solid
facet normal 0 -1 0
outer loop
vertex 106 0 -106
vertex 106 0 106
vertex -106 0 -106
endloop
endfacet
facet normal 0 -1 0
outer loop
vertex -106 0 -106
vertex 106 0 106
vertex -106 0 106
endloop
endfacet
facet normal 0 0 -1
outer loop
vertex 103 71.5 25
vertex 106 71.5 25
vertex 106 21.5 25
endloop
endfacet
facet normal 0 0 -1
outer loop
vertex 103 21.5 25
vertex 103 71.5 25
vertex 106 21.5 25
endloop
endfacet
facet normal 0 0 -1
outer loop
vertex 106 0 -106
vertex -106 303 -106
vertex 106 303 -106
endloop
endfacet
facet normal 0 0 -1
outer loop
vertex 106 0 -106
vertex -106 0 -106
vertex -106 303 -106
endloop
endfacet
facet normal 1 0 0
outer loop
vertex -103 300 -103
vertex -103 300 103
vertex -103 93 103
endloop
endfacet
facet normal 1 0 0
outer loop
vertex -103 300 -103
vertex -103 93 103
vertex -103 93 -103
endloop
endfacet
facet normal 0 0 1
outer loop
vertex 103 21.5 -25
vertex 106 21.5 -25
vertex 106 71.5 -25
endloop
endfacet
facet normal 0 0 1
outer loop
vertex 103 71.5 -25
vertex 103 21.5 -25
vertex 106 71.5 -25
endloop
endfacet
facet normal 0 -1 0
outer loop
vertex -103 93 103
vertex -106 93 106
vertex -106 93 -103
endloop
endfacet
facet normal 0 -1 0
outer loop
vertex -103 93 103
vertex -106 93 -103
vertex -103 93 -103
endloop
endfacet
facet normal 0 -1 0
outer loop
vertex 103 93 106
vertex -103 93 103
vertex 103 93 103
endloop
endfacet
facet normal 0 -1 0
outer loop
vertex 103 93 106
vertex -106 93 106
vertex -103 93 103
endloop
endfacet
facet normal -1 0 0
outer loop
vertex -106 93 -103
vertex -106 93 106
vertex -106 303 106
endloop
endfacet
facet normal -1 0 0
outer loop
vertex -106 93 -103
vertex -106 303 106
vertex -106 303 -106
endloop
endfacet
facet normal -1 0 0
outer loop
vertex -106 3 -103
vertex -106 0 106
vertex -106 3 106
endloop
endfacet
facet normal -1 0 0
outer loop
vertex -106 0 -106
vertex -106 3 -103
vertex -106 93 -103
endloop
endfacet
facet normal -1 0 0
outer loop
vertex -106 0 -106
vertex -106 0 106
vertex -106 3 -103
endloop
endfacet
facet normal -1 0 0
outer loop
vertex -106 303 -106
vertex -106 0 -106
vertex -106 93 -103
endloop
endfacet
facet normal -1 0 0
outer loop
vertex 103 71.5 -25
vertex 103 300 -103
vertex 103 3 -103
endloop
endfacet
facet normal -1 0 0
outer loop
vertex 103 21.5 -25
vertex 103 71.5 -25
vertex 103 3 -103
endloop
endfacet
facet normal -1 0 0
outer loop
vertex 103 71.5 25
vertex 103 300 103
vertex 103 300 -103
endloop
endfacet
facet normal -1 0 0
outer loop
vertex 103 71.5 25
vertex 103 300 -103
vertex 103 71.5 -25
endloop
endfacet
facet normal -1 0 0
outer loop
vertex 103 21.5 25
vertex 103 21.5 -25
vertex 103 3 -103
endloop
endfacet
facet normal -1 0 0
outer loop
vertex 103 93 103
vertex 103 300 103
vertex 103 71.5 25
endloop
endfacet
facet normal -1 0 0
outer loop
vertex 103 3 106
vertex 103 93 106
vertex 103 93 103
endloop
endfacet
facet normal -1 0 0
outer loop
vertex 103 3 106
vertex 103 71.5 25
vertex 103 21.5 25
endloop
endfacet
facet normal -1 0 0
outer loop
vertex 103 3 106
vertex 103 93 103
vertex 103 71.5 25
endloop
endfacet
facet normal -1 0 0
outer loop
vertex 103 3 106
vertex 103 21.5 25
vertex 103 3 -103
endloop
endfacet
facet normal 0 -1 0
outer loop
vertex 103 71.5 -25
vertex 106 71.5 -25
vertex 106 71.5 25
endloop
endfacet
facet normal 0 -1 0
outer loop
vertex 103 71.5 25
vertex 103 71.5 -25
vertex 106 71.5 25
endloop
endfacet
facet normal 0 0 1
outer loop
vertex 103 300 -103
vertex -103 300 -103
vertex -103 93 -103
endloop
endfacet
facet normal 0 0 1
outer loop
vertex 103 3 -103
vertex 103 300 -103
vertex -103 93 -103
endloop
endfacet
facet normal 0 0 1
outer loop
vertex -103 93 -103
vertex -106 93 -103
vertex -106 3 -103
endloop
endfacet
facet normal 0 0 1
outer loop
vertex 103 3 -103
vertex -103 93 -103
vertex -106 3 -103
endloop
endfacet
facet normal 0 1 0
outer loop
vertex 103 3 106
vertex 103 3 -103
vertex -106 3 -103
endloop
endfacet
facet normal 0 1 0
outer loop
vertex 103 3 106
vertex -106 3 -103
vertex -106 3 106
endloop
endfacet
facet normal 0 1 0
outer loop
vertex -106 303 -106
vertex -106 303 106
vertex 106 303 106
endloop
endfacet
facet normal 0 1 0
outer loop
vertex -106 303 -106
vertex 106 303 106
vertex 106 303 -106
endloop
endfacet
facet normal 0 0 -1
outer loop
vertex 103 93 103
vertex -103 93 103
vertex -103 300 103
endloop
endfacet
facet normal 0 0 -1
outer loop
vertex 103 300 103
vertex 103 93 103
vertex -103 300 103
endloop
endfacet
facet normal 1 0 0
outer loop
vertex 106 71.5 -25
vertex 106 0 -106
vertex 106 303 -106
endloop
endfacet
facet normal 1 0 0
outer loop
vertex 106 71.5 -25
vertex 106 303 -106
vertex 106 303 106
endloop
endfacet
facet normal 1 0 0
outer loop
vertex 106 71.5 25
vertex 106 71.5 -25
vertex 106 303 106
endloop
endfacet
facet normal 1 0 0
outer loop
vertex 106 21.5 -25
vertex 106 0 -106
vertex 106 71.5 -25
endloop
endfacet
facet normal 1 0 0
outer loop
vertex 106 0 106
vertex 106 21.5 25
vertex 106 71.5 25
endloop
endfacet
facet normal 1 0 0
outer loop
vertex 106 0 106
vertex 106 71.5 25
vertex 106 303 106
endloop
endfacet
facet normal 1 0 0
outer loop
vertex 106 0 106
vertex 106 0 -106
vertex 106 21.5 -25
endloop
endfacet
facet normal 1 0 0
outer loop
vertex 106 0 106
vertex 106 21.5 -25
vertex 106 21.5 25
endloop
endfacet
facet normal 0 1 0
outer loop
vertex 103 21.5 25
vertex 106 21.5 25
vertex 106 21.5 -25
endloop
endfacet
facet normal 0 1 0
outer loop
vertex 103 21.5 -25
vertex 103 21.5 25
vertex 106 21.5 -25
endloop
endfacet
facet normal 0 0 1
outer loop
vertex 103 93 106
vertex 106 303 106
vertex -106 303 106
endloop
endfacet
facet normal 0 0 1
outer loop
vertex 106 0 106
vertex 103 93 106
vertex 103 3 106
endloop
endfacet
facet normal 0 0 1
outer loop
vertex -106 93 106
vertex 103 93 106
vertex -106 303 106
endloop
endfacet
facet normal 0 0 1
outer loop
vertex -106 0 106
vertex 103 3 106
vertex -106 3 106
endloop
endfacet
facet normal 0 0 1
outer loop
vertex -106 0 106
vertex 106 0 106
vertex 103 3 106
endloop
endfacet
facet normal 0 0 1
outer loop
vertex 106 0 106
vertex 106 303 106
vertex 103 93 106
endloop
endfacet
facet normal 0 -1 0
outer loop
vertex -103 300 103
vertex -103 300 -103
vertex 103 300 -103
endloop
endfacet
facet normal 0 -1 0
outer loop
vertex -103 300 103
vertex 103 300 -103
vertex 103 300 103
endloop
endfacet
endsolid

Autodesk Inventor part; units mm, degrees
ref_plane "YZ Plane" through (0, 0, 0) normal (1, 0, 0) x (0, 1, 0)
ref_plane "XZ Plane" through (0, 0, 0) normal (0, 1, 0) x (-1, 0, 0)
ref_plane "XY Plane" through (0, 0, 0) normal (0, 0, 1) x (1, 0, 0)
sketch "Sketch1" plane through (0, 0, 0) normal (0, 1, 0) x (-1, 0, 0)
  line L0 (-106, 106) -> (106, 106)
  line L1 (106, 106) -> (106, -106)
  line L2 (106, -106) -> (-106, -106)
  line L3 (-106, -106) -> (-106, 106)
  line L4 (-106, 106) -> (106, -106) construction
  line L5 (106, 106) -> (-106, -106) construction
  point P0 (0, 0)
  dimension "d0" = 212
  dimension "d1" = 212
extrude "Extrusion1" add sketch "Sketch1" along normal blind 3
sketch "Sketch2" plane through (0, 3, 0) normal (0, 1, 0) x (1, 0, 0)
  line L0 (-106, 106) -> (-106, -106) projected
  line L1 (106, 106) -> (-106, 106) projected
  line L2 (-106, -106) -> (-103, -106)
  line L3 (-103, -106) -> (-103, 106)
  line L4 (-103, 106) -> (-106, 106)
  line L5 (-106, 106) -> (-106, -106)
  line L6 (106, -106) -> (106, 106) projected
  line L7 (-106, -106) -> (106, -106) projected
  line L8 (106, 106) -> (103, 106)
  line L9 (103, 106) -> (103, -106)
  line L10 (103, -106) -> (106, -106)
  line L11 (106, -106) -> (106, 106)
  line L12 (106, 106) -> (-106, 106)
  line L13 (-106, 106) -> (-106, 103)
  line L14 (-106, 103) -> (106, 103)
  line L15 (106, 103) -> (106, 106)
  line L16 (-106, -106) -> (106, -106)
  line L17 (106, -106) -> (106, -103)
  line L18 (106, -103) -> (-106, -103)
  line L19 (-106, -103) -> (-106, -106)
  point P0 (0, 0)
  point P1 (-103, 103)
  point P2 (103, 103)
  point P3 (103, -103)
  point P4 (-103, -103)
  dimension "d4" = 3
  dimension "d5" = 3
  dimension "d6" = 3
  dimension "d7" = 3
extrude "Extrusion2" add sketch "Sketch2" along normal blind 300 contours L1 L3 L14 L0 | L14 L3 L18 L0 | L1 L9 L14 L3 | L18 L3 L2 L0 | L1 L6 L14 L9 | L18 L9 L7 L3 | L14 L6 L18 L9 | L18 L6 L7 L9
sketch "Sketch3" plane through (-103, 3, 103) normal (1, 0, 0) x (0, 0, -1)
  line L0 (0, 0) -> (0, 300) projected
  line L1 (206, 0) -> (206, 300) projected
  line L2 (0, 300) -> (206, 300)
  line L3 (206, 300) -> (206, 297)
  line L4 (206, 297) -> (0, 297)
  line L5 (0, 297) -> (0, 300)
  point P0 (103, -3)
  dimension "d10" = 3
extrude "Extrusion3" add sketch "Sketch3" along normal up to surface (209 mm away)
sketch "Sketch4" plane through (-106, 0, -106) normal (-1, 0, 0) x (0, 0, 1)
  line L0 (3, 3) -> (209, 3) projected
  line L1 (3, 3) -> (209, 3)
  line L2 (209, 3) -> (209, 93)
  line L3 (209, 93) -> (3, 93)
  line L4 (3, 93) -> (3, 3)
  point P0 (106, 0)
  dimension "d13" = 90
extrude "Extrusion4" cut sketch "Sketch4" against normal blind 10
sketch "Sketch5" plane through (-106, 0, 106) normal (0, 0, 1) x (1, 0, 0)
  line L0 (0, 93) -> (3, 93) projected
  line L1 (0, 3) -> (209, 3) projected
  line L2 (0, 93) -> (209, 93)
  line L3 (209, 93) -> (209, 3)
  line L4 (209, 3) -> (0, 3)
  line L5 (0, 3) -> (0, 93)
  point P0 (106, 0)
extrude "Extrusion5" cut sketch "Sketch5" against normal blind 10
sketch "Sketch6" plane through (106, 0, 106) normal (1, 0, 0) x (0, 0, -1)
  line L0 (3, 93) -> (209, 93) projected
  line L1 (0, 303) -> (212, 303) projected
  line L2 (0, 0) -> (0, 303) projected
  line L3 (0, 0) -> (212, 0) projected
  line L4 (212, 0) -> (212, 303) projected
  line L5 (212, 0) -> (0, 0)
  line L6 (0, 0) -> (0, 93)
  line L7 (0, 93) -> (212, 93)
  line L8 (212, 93) -> (212, 0)
  line L9 (212, 93) -> (0, 0) construction
  line L10 (0, 93) -> (0, 3) construction
  line L11 (0, 93) -> (212, 0) construction
  line L12 (131, 71.5) -> (81, 71.5)
  line L13 (81, 71.5) -> (81, 21.5)
  line L14 (81, 21.5) -> (131, 21.5)
  line L15 (131, 21.5) -> (131, 71.5)
  line L16 (131, 71.5) -> (81, 21.5) construction
  line L17 (81, 71.5) -> (131, 21.5) construction
  point P0 (106, 0)
  point P1 (106, 46.5)
  dimension "d18" = 50
  dimension "d19" = 50
extrude "Extrusion6" cut sketch "Sketch6" against normal blind 10 contours L15 L14 L13 L12
properties part number "Hot Box Case" material "Polycarbonate, Smoke"
